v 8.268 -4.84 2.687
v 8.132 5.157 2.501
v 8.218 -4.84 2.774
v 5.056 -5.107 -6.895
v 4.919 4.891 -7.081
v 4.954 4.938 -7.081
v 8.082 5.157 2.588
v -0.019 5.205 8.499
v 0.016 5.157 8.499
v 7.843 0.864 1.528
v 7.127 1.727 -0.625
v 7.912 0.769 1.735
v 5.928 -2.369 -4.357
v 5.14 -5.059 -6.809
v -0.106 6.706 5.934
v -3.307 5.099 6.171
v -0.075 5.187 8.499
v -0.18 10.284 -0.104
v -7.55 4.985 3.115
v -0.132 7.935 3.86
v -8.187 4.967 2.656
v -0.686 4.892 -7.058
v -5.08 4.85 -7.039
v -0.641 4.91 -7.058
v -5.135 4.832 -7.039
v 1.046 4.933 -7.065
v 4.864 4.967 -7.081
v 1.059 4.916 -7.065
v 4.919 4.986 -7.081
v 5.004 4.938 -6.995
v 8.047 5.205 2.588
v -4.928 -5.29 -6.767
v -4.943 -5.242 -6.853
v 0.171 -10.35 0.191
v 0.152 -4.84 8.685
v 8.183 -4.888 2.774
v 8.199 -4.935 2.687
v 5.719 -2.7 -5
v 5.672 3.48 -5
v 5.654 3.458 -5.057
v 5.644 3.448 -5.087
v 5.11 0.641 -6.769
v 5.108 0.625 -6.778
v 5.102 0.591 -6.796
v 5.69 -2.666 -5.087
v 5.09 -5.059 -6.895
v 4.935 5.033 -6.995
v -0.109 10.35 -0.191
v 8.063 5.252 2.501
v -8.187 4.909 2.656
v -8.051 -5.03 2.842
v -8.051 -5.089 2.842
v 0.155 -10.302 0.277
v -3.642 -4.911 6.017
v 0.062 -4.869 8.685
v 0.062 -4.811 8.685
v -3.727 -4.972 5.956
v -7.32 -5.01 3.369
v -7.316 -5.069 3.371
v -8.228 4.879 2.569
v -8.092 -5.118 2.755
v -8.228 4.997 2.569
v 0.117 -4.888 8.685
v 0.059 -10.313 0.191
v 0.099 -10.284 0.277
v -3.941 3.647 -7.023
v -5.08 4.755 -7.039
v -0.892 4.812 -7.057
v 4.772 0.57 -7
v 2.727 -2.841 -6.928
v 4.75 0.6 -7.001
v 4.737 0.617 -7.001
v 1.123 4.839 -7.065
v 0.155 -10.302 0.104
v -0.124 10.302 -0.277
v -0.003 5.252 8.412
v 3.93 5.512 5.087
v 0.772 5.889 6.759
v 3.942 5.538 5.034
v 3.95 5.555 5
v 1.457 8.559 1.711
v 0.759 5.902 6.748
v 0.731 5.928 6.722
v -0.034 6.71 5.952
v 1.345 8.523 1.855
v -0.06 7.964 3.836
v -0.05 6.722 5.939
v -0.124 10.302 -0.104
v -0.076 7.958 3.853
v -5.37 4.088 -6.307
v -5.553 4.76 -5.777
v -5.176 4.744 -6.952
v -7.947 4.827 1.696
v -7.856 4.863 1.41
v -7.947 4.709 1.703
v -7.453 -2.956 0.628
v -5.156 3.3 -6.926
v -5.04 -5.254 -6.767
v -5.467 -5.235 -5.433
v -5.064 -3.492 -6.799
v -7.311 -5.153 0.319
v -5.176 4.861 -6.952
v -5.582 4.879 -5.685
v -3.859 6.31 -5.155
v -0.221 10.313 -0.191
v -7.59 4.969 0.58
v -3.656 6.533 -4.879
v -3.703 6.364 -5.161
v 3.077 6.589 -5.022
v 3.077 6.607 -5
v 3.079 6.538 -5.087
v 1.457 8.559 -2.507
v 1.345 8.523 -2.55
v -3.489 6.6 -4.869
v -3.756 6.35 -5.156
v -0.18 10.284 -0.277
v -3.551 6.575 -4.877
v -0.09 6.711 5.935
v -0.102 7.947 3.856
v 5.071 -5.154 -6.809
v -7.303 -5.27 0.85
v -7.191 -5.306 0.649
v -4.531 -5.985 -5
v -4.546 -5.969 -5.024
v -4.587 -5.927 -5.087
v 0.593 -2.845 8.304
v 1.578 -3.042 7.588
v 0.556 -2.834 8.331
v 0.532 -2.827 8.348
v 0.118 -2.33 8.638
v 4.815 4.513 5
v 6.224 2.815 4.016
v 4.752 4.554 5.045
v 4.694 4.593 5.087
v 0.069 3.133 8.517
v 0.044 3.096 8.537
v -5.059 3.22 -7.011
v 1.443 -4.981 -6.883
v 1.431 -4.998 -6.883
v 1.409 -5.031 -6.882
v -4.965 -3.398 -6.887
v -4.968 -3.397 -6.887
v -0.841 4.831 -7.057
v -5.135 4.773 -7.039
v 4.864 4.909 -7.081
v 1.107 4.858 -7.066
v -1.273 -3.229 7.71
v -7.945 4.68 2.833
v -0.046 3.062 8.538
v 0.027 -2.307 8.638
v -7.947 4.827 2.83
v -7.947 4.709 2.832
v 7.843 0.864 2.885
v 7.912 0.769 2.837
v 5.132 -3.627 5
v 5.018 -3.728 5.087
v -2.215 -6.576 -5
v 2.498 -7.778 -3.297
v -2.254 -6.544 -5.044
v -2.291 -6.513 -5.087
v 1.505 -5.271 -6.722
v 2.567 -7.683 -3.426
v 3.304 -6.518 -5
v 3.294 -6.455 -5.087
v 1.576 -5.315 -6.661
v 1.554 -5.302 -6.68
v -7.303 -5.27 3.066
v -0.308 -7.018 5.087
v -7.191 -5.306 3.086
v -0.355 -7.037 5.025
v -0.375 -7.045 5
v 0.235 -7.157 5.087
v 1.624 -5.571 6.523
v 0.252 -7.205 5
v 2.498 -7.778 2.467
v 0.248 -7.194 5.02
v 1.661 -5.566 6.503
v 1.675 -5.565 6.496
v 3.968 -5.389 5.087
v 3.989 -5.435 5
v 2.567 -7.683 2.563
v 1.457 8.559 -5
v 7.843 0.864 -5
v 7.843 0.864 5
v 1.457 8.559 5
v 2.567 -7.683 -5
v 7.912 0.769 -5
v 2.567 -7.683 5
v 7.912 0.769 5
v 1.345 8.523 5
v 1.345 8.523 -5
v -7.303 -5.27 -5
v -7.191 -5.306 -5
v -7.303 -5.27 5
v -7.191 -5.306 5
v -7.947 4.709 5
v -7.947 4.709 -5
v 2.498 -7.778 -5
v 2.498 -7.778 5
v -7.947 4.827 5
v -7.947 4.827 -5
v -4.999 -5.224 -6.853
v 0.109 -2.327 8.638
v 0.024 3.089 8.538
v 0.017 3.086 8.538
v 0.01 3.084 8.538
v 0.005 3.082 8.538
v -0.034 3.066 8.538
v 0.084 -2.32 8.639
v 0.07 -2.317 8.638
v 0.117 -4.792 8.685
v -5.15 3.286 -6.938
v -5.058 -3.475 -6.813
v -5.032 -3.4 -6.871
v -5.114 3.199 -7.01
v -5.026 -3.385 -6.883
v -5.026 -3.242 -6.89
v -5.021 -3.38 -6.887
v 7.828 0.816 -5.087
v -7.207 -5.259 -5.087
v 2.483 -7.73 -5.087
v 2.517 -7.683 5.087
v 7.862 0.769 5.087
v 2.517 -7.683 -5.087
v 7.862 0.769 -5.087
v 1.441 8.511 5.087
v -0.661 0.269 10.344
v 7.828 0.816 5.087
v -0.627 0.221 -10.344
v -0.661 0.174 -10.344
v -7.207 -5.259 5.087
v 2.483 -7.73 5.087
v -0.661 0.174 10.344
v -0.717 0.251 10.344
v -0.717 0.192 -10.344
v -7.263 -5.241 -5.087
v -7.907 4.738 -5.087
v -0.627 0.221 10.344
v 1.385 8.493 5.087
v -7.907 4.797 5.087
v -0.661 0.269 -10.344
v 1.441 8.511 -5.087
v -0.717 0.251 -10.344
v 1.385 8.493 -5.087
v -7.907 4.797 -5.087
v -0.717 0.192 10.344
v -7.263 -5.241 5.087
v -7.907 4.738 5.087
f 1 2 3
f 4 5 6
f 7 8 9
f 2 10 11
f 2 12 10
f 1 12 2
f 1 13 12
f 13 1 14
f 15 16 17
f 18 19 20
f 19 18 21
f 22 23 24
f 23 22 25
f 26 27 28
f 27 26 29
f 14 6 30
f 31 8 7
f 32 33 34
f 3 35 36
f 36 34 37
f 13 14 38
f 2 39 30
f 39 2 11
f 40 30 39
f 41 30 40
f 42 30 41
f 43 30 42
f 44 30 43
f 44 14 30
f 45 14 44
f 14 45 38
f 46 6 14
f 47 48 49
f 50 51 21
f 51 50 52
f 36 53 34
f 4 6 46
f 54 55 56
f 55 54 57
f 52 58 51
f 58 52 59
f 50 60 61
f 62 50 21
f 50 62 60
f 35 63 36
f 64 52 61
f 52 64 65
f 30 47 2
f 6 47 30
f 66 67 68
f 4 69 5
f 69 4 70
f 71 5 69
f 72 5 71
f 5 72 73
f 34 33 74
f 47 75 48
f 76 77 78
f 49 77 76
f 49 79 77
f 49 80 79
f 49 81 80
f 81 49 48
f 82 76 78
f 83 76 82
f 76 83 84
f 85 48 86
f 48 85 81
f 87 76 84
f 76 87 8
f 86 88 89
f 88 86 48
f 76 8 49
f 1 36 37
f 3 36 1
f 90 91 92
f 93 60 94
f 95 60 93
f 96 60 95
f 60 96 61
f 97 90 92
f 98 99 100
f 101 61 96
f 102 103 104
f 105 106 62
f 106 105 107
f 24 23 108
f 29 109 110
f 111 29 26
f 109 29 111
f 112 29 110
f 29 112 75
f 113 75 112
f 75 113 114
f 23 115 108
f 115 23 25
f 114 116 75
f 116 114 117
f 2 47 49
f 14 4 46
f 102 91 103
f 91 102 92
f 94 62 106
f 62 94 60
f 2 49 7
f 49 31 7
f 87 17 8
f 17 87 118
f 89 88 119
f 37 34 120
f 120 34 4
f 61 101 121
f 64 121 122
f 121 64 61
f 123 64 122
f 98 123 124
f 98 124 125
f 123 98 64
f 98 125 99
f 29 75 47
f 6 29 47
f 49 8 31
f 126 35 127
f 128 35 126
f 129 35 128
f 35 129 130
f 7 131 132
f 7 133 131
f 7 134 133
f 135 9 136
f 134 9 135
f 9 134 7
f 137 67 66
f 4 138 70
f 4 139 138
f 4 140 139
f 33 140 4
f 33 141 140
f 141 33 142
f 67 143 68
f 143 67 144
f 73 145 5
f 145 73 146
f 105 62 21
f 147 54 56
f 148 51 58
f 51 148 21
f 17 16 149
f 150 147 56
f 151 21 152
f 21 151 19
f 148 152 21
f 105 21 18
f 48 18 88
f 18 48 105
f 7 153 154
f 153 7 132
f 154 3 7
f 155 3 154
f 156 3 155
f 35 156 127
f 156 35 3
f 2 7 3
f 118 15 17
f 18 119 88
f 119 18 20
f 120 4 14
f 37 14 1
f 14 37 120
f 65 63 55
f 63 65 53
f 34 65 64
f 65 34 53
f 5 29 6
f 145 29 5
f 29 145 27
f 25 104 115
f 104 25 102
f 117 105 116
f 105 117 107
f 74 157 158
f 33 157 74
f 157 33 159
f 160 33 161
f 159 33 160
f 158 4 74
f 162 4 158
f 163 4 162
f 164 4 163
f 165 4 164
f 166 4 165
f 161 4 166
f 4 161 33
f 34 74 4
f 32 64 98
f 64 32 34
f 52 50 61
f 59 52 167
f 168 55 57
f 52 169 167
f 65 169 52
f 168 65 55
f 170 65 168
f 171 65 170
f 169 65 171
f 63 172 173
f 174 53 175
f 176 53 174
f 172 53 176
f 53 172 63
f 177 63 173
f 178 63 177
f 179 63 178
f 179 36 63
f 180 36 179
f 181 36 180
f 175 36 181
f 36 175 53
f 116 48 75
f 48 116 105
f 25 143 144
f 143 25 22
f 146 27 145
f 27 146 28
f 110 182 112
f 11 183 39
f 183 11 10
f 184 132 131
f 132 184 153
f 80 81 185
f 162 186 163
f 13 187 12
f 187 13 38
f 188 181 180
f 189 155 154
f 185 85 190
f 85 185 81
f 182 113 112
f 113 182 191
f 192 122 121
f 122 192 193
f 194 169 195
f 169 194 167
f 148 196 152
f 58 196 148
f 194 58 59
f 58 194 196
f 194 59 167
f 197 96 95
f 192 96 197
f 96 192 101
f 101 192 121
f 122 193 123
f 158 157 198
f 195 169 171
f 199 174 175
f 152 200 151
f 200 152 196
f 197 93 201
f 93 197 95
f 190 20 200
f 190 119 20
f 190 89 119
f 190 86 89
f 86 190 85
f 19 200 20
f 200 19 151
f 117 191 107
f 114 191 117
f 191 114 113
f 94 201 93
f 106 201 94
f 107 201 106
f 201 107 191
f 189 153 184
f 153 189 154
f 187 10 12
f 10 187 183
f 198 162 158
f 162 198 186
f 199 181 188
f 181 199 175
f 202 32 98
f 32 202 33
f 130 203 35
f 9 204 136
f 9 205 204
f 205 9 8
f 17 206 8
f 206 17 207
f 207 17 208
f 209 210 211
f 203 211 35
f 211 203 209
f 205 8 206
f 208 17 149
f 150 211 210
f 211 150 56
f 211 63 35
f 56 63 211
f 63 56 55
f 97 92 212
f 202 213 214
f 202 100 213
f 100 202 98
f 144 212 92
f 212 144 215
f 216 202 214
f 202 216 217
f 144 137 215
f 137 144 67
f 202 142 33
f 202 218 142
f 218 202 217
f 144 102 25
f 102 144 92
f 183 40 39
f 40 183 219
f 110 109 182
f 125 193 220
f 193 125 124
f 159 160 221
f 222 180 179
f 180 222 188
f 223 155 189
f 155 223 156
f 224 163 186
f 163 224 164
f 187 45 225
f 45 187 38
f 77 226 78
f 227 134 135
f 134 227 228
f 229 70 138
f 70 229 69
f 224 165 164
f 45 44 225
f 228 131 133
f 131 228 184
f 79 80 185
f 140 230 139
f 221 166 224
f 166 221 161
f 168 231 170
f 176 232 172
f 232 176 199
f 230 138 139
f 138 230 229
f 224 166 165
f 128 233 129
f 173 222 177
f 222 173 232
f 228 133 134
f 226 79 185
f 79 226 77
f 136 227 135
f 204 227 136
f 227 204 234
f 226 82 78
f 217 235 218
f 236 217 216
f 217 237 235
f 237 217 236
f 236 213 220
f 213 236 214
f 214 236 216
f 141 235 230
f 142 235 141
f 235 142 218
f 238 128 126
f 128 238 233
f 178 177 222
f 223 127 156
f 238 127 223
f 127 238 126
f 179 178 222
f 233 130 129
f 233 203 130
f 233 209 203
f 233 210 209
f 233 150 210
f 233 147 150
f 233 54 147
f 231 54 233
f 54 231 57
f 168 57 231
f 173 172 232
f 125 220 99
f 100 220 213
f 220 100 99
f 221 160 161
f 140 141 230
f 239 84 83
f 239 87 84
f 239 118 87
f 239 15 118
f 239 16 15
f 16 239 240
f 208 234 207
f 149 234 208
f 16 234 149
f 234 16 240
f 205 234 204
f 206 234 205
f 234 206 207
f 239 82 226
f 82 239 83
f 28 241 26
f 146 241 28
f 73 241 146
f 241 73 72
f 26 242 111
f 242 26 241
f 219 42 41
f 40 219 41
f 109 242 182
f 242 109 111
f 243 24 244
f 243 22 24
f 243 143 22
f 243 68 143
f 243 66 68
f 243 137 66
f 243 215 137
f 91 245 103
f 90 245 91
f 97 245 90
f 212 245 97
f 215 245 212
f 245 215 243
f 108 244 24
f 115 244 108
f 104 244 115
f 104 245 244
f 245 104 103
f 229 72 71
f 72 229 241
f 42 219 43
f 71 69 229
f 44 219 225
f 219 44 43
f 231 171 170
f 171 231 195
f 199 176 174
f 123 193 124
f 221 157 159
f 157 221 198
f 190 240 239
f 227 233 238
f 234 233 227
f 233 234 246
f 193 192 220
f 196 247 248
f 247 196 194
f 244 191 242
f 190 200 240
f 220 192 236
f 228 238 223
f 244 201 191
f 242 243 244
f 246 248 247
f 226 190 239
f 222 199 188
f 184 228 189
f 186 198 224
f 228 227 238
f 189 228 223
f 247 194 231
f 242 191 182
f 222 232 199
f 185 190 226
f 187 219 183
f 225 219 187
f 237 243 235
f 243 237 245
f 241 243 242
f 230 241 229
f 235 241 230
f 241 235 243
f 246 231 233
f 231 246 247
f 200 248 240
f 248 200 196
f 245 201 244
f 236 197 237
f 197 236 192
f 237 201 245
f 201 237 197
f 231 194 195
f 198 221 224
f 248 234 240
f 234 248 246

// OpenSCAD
// Auto-generated OpenSCAD file

    inner_points = 10*[[0.2467382987372412, -0.7682886734949378, -0.49999999999986955], [0.24673829873693467, -0.7682886734948948, 0.5000000000001305], [-0.786615939624791, 0.4767868289582747, -0.5000000000002401], [-0.7866159396250976, 0.47678682895831764, 0.4999999999997599], [0.7812222187521125, 0.07688996989682276, -0.499999999999742], [0.7812222187518058, 0.07688996989686578, 0.5000000000002579], [0.14257417702561617, 0.8463889489727611, -0.499999999999971], [0.14257417702530947, 0.8463889489728041, 0.500000000000029], [-0.7222389719987257, -0.5211388226006342, -0.5000000000001773], [-0.7222389719990324, -0.5211388226005911, 0.49999999999982264], [-0.06766404342154811, 0.022127650346434623, -1.0257311121191337], [-0.06766404342217727, 0.022127650346523024, 1.0257311121191337]];

    outer_points = 10*[[0.49039615507641166, 0.4938060709977507, -0.6994812171045163], [0.5040254575535104, -0.5059280714671878, -0.6808831929115636], [-0.8147039687334786, 0.4938060709977507, 0.25694319474479665], [-0.8010746662563799, -0.5059280714671878, 0.2755412189377493], [0.8031669173012401, 0.5157349758527835, 0.2500942530026042], [0.8167962197783389, -0.48399916661215503, 0.26869227719555683], [-0.0034293179349679237, 0.5157349758527835, 0.8411970471956072], [0.010199984542130835, -0.48399916661215503, 0.8597950713885598], [-0.5095030419019521, 0.48025326246127786, -0.6952483383208733], [-0.49587373942485335, -0.5194808800036607, -0.6766503141279206], [-0.01397999958724252, 1.02545841377403, -0.019076572038655804], [0.01397999958724252, -1.02545841377403, 0.019076572038655804]];

    // Convex hull for inner set (I)
    module inner_hull() {
        hull() {
            for (p = inner_points) {
                translate(p) sphere(r=0.1);
            }
        }
    }

    // Convex hull for outer set (O) minus inner hull (O \ I)
    module outer_minus_inner() {
        difference() {
            hull() {
                for (p = outer_points) {
                    translate(p) sphere(r=0.1);
                }
            }
            inner_hull(); // Subtract inner hull
        }
    }

    // Convex hull for outer set (O) minus all translated inner hulls
    module outer_minus_AllTranslationInner() {
        difference() {
            hull() {
                for (p = outer_points) {
                    translate(p) sphere(r=0.1);
                }
            }
            hull() {
                translate([0,0,50]) inner_hull();
                translate([0,0,-50]) inner_hull();
            }; // Subtract translated inner hulls
        }
    }

    // Difference between outer_minus_inner and outer_minus_AllTranslationInner
    module outer_minus_inner_diff() {
        difference() {
            // Outer minus inner
            difference() {
                hull() {
                    for (p = outer_points) {
                        translate(p) sphere(r=0.1);
                    }
                }
                inner_hull();
            }

            // Subtract Outer minus AllTranslationInner
            difference() {
                hull() {
                    for (p = outer_points) {
                        translate(p) sphere(r=0.1);
                    }
                }
                hull() {
                    translate([0,0,50]) inner_hull();
                    translate([0,0,-50]) inner_hull();
                };
            }
        }
    }

    // Rendering all with colors applied
    color([1, 0, 0, 0.5]) inner_hull(); // Transparent red
    color([0, 1, 0, 1]) outer_minus_AllTranslationInner(); // Opaque green
    color([1, 1, 0, 1]) outer_minus_inner_diff(); // Opaque yellow
    
